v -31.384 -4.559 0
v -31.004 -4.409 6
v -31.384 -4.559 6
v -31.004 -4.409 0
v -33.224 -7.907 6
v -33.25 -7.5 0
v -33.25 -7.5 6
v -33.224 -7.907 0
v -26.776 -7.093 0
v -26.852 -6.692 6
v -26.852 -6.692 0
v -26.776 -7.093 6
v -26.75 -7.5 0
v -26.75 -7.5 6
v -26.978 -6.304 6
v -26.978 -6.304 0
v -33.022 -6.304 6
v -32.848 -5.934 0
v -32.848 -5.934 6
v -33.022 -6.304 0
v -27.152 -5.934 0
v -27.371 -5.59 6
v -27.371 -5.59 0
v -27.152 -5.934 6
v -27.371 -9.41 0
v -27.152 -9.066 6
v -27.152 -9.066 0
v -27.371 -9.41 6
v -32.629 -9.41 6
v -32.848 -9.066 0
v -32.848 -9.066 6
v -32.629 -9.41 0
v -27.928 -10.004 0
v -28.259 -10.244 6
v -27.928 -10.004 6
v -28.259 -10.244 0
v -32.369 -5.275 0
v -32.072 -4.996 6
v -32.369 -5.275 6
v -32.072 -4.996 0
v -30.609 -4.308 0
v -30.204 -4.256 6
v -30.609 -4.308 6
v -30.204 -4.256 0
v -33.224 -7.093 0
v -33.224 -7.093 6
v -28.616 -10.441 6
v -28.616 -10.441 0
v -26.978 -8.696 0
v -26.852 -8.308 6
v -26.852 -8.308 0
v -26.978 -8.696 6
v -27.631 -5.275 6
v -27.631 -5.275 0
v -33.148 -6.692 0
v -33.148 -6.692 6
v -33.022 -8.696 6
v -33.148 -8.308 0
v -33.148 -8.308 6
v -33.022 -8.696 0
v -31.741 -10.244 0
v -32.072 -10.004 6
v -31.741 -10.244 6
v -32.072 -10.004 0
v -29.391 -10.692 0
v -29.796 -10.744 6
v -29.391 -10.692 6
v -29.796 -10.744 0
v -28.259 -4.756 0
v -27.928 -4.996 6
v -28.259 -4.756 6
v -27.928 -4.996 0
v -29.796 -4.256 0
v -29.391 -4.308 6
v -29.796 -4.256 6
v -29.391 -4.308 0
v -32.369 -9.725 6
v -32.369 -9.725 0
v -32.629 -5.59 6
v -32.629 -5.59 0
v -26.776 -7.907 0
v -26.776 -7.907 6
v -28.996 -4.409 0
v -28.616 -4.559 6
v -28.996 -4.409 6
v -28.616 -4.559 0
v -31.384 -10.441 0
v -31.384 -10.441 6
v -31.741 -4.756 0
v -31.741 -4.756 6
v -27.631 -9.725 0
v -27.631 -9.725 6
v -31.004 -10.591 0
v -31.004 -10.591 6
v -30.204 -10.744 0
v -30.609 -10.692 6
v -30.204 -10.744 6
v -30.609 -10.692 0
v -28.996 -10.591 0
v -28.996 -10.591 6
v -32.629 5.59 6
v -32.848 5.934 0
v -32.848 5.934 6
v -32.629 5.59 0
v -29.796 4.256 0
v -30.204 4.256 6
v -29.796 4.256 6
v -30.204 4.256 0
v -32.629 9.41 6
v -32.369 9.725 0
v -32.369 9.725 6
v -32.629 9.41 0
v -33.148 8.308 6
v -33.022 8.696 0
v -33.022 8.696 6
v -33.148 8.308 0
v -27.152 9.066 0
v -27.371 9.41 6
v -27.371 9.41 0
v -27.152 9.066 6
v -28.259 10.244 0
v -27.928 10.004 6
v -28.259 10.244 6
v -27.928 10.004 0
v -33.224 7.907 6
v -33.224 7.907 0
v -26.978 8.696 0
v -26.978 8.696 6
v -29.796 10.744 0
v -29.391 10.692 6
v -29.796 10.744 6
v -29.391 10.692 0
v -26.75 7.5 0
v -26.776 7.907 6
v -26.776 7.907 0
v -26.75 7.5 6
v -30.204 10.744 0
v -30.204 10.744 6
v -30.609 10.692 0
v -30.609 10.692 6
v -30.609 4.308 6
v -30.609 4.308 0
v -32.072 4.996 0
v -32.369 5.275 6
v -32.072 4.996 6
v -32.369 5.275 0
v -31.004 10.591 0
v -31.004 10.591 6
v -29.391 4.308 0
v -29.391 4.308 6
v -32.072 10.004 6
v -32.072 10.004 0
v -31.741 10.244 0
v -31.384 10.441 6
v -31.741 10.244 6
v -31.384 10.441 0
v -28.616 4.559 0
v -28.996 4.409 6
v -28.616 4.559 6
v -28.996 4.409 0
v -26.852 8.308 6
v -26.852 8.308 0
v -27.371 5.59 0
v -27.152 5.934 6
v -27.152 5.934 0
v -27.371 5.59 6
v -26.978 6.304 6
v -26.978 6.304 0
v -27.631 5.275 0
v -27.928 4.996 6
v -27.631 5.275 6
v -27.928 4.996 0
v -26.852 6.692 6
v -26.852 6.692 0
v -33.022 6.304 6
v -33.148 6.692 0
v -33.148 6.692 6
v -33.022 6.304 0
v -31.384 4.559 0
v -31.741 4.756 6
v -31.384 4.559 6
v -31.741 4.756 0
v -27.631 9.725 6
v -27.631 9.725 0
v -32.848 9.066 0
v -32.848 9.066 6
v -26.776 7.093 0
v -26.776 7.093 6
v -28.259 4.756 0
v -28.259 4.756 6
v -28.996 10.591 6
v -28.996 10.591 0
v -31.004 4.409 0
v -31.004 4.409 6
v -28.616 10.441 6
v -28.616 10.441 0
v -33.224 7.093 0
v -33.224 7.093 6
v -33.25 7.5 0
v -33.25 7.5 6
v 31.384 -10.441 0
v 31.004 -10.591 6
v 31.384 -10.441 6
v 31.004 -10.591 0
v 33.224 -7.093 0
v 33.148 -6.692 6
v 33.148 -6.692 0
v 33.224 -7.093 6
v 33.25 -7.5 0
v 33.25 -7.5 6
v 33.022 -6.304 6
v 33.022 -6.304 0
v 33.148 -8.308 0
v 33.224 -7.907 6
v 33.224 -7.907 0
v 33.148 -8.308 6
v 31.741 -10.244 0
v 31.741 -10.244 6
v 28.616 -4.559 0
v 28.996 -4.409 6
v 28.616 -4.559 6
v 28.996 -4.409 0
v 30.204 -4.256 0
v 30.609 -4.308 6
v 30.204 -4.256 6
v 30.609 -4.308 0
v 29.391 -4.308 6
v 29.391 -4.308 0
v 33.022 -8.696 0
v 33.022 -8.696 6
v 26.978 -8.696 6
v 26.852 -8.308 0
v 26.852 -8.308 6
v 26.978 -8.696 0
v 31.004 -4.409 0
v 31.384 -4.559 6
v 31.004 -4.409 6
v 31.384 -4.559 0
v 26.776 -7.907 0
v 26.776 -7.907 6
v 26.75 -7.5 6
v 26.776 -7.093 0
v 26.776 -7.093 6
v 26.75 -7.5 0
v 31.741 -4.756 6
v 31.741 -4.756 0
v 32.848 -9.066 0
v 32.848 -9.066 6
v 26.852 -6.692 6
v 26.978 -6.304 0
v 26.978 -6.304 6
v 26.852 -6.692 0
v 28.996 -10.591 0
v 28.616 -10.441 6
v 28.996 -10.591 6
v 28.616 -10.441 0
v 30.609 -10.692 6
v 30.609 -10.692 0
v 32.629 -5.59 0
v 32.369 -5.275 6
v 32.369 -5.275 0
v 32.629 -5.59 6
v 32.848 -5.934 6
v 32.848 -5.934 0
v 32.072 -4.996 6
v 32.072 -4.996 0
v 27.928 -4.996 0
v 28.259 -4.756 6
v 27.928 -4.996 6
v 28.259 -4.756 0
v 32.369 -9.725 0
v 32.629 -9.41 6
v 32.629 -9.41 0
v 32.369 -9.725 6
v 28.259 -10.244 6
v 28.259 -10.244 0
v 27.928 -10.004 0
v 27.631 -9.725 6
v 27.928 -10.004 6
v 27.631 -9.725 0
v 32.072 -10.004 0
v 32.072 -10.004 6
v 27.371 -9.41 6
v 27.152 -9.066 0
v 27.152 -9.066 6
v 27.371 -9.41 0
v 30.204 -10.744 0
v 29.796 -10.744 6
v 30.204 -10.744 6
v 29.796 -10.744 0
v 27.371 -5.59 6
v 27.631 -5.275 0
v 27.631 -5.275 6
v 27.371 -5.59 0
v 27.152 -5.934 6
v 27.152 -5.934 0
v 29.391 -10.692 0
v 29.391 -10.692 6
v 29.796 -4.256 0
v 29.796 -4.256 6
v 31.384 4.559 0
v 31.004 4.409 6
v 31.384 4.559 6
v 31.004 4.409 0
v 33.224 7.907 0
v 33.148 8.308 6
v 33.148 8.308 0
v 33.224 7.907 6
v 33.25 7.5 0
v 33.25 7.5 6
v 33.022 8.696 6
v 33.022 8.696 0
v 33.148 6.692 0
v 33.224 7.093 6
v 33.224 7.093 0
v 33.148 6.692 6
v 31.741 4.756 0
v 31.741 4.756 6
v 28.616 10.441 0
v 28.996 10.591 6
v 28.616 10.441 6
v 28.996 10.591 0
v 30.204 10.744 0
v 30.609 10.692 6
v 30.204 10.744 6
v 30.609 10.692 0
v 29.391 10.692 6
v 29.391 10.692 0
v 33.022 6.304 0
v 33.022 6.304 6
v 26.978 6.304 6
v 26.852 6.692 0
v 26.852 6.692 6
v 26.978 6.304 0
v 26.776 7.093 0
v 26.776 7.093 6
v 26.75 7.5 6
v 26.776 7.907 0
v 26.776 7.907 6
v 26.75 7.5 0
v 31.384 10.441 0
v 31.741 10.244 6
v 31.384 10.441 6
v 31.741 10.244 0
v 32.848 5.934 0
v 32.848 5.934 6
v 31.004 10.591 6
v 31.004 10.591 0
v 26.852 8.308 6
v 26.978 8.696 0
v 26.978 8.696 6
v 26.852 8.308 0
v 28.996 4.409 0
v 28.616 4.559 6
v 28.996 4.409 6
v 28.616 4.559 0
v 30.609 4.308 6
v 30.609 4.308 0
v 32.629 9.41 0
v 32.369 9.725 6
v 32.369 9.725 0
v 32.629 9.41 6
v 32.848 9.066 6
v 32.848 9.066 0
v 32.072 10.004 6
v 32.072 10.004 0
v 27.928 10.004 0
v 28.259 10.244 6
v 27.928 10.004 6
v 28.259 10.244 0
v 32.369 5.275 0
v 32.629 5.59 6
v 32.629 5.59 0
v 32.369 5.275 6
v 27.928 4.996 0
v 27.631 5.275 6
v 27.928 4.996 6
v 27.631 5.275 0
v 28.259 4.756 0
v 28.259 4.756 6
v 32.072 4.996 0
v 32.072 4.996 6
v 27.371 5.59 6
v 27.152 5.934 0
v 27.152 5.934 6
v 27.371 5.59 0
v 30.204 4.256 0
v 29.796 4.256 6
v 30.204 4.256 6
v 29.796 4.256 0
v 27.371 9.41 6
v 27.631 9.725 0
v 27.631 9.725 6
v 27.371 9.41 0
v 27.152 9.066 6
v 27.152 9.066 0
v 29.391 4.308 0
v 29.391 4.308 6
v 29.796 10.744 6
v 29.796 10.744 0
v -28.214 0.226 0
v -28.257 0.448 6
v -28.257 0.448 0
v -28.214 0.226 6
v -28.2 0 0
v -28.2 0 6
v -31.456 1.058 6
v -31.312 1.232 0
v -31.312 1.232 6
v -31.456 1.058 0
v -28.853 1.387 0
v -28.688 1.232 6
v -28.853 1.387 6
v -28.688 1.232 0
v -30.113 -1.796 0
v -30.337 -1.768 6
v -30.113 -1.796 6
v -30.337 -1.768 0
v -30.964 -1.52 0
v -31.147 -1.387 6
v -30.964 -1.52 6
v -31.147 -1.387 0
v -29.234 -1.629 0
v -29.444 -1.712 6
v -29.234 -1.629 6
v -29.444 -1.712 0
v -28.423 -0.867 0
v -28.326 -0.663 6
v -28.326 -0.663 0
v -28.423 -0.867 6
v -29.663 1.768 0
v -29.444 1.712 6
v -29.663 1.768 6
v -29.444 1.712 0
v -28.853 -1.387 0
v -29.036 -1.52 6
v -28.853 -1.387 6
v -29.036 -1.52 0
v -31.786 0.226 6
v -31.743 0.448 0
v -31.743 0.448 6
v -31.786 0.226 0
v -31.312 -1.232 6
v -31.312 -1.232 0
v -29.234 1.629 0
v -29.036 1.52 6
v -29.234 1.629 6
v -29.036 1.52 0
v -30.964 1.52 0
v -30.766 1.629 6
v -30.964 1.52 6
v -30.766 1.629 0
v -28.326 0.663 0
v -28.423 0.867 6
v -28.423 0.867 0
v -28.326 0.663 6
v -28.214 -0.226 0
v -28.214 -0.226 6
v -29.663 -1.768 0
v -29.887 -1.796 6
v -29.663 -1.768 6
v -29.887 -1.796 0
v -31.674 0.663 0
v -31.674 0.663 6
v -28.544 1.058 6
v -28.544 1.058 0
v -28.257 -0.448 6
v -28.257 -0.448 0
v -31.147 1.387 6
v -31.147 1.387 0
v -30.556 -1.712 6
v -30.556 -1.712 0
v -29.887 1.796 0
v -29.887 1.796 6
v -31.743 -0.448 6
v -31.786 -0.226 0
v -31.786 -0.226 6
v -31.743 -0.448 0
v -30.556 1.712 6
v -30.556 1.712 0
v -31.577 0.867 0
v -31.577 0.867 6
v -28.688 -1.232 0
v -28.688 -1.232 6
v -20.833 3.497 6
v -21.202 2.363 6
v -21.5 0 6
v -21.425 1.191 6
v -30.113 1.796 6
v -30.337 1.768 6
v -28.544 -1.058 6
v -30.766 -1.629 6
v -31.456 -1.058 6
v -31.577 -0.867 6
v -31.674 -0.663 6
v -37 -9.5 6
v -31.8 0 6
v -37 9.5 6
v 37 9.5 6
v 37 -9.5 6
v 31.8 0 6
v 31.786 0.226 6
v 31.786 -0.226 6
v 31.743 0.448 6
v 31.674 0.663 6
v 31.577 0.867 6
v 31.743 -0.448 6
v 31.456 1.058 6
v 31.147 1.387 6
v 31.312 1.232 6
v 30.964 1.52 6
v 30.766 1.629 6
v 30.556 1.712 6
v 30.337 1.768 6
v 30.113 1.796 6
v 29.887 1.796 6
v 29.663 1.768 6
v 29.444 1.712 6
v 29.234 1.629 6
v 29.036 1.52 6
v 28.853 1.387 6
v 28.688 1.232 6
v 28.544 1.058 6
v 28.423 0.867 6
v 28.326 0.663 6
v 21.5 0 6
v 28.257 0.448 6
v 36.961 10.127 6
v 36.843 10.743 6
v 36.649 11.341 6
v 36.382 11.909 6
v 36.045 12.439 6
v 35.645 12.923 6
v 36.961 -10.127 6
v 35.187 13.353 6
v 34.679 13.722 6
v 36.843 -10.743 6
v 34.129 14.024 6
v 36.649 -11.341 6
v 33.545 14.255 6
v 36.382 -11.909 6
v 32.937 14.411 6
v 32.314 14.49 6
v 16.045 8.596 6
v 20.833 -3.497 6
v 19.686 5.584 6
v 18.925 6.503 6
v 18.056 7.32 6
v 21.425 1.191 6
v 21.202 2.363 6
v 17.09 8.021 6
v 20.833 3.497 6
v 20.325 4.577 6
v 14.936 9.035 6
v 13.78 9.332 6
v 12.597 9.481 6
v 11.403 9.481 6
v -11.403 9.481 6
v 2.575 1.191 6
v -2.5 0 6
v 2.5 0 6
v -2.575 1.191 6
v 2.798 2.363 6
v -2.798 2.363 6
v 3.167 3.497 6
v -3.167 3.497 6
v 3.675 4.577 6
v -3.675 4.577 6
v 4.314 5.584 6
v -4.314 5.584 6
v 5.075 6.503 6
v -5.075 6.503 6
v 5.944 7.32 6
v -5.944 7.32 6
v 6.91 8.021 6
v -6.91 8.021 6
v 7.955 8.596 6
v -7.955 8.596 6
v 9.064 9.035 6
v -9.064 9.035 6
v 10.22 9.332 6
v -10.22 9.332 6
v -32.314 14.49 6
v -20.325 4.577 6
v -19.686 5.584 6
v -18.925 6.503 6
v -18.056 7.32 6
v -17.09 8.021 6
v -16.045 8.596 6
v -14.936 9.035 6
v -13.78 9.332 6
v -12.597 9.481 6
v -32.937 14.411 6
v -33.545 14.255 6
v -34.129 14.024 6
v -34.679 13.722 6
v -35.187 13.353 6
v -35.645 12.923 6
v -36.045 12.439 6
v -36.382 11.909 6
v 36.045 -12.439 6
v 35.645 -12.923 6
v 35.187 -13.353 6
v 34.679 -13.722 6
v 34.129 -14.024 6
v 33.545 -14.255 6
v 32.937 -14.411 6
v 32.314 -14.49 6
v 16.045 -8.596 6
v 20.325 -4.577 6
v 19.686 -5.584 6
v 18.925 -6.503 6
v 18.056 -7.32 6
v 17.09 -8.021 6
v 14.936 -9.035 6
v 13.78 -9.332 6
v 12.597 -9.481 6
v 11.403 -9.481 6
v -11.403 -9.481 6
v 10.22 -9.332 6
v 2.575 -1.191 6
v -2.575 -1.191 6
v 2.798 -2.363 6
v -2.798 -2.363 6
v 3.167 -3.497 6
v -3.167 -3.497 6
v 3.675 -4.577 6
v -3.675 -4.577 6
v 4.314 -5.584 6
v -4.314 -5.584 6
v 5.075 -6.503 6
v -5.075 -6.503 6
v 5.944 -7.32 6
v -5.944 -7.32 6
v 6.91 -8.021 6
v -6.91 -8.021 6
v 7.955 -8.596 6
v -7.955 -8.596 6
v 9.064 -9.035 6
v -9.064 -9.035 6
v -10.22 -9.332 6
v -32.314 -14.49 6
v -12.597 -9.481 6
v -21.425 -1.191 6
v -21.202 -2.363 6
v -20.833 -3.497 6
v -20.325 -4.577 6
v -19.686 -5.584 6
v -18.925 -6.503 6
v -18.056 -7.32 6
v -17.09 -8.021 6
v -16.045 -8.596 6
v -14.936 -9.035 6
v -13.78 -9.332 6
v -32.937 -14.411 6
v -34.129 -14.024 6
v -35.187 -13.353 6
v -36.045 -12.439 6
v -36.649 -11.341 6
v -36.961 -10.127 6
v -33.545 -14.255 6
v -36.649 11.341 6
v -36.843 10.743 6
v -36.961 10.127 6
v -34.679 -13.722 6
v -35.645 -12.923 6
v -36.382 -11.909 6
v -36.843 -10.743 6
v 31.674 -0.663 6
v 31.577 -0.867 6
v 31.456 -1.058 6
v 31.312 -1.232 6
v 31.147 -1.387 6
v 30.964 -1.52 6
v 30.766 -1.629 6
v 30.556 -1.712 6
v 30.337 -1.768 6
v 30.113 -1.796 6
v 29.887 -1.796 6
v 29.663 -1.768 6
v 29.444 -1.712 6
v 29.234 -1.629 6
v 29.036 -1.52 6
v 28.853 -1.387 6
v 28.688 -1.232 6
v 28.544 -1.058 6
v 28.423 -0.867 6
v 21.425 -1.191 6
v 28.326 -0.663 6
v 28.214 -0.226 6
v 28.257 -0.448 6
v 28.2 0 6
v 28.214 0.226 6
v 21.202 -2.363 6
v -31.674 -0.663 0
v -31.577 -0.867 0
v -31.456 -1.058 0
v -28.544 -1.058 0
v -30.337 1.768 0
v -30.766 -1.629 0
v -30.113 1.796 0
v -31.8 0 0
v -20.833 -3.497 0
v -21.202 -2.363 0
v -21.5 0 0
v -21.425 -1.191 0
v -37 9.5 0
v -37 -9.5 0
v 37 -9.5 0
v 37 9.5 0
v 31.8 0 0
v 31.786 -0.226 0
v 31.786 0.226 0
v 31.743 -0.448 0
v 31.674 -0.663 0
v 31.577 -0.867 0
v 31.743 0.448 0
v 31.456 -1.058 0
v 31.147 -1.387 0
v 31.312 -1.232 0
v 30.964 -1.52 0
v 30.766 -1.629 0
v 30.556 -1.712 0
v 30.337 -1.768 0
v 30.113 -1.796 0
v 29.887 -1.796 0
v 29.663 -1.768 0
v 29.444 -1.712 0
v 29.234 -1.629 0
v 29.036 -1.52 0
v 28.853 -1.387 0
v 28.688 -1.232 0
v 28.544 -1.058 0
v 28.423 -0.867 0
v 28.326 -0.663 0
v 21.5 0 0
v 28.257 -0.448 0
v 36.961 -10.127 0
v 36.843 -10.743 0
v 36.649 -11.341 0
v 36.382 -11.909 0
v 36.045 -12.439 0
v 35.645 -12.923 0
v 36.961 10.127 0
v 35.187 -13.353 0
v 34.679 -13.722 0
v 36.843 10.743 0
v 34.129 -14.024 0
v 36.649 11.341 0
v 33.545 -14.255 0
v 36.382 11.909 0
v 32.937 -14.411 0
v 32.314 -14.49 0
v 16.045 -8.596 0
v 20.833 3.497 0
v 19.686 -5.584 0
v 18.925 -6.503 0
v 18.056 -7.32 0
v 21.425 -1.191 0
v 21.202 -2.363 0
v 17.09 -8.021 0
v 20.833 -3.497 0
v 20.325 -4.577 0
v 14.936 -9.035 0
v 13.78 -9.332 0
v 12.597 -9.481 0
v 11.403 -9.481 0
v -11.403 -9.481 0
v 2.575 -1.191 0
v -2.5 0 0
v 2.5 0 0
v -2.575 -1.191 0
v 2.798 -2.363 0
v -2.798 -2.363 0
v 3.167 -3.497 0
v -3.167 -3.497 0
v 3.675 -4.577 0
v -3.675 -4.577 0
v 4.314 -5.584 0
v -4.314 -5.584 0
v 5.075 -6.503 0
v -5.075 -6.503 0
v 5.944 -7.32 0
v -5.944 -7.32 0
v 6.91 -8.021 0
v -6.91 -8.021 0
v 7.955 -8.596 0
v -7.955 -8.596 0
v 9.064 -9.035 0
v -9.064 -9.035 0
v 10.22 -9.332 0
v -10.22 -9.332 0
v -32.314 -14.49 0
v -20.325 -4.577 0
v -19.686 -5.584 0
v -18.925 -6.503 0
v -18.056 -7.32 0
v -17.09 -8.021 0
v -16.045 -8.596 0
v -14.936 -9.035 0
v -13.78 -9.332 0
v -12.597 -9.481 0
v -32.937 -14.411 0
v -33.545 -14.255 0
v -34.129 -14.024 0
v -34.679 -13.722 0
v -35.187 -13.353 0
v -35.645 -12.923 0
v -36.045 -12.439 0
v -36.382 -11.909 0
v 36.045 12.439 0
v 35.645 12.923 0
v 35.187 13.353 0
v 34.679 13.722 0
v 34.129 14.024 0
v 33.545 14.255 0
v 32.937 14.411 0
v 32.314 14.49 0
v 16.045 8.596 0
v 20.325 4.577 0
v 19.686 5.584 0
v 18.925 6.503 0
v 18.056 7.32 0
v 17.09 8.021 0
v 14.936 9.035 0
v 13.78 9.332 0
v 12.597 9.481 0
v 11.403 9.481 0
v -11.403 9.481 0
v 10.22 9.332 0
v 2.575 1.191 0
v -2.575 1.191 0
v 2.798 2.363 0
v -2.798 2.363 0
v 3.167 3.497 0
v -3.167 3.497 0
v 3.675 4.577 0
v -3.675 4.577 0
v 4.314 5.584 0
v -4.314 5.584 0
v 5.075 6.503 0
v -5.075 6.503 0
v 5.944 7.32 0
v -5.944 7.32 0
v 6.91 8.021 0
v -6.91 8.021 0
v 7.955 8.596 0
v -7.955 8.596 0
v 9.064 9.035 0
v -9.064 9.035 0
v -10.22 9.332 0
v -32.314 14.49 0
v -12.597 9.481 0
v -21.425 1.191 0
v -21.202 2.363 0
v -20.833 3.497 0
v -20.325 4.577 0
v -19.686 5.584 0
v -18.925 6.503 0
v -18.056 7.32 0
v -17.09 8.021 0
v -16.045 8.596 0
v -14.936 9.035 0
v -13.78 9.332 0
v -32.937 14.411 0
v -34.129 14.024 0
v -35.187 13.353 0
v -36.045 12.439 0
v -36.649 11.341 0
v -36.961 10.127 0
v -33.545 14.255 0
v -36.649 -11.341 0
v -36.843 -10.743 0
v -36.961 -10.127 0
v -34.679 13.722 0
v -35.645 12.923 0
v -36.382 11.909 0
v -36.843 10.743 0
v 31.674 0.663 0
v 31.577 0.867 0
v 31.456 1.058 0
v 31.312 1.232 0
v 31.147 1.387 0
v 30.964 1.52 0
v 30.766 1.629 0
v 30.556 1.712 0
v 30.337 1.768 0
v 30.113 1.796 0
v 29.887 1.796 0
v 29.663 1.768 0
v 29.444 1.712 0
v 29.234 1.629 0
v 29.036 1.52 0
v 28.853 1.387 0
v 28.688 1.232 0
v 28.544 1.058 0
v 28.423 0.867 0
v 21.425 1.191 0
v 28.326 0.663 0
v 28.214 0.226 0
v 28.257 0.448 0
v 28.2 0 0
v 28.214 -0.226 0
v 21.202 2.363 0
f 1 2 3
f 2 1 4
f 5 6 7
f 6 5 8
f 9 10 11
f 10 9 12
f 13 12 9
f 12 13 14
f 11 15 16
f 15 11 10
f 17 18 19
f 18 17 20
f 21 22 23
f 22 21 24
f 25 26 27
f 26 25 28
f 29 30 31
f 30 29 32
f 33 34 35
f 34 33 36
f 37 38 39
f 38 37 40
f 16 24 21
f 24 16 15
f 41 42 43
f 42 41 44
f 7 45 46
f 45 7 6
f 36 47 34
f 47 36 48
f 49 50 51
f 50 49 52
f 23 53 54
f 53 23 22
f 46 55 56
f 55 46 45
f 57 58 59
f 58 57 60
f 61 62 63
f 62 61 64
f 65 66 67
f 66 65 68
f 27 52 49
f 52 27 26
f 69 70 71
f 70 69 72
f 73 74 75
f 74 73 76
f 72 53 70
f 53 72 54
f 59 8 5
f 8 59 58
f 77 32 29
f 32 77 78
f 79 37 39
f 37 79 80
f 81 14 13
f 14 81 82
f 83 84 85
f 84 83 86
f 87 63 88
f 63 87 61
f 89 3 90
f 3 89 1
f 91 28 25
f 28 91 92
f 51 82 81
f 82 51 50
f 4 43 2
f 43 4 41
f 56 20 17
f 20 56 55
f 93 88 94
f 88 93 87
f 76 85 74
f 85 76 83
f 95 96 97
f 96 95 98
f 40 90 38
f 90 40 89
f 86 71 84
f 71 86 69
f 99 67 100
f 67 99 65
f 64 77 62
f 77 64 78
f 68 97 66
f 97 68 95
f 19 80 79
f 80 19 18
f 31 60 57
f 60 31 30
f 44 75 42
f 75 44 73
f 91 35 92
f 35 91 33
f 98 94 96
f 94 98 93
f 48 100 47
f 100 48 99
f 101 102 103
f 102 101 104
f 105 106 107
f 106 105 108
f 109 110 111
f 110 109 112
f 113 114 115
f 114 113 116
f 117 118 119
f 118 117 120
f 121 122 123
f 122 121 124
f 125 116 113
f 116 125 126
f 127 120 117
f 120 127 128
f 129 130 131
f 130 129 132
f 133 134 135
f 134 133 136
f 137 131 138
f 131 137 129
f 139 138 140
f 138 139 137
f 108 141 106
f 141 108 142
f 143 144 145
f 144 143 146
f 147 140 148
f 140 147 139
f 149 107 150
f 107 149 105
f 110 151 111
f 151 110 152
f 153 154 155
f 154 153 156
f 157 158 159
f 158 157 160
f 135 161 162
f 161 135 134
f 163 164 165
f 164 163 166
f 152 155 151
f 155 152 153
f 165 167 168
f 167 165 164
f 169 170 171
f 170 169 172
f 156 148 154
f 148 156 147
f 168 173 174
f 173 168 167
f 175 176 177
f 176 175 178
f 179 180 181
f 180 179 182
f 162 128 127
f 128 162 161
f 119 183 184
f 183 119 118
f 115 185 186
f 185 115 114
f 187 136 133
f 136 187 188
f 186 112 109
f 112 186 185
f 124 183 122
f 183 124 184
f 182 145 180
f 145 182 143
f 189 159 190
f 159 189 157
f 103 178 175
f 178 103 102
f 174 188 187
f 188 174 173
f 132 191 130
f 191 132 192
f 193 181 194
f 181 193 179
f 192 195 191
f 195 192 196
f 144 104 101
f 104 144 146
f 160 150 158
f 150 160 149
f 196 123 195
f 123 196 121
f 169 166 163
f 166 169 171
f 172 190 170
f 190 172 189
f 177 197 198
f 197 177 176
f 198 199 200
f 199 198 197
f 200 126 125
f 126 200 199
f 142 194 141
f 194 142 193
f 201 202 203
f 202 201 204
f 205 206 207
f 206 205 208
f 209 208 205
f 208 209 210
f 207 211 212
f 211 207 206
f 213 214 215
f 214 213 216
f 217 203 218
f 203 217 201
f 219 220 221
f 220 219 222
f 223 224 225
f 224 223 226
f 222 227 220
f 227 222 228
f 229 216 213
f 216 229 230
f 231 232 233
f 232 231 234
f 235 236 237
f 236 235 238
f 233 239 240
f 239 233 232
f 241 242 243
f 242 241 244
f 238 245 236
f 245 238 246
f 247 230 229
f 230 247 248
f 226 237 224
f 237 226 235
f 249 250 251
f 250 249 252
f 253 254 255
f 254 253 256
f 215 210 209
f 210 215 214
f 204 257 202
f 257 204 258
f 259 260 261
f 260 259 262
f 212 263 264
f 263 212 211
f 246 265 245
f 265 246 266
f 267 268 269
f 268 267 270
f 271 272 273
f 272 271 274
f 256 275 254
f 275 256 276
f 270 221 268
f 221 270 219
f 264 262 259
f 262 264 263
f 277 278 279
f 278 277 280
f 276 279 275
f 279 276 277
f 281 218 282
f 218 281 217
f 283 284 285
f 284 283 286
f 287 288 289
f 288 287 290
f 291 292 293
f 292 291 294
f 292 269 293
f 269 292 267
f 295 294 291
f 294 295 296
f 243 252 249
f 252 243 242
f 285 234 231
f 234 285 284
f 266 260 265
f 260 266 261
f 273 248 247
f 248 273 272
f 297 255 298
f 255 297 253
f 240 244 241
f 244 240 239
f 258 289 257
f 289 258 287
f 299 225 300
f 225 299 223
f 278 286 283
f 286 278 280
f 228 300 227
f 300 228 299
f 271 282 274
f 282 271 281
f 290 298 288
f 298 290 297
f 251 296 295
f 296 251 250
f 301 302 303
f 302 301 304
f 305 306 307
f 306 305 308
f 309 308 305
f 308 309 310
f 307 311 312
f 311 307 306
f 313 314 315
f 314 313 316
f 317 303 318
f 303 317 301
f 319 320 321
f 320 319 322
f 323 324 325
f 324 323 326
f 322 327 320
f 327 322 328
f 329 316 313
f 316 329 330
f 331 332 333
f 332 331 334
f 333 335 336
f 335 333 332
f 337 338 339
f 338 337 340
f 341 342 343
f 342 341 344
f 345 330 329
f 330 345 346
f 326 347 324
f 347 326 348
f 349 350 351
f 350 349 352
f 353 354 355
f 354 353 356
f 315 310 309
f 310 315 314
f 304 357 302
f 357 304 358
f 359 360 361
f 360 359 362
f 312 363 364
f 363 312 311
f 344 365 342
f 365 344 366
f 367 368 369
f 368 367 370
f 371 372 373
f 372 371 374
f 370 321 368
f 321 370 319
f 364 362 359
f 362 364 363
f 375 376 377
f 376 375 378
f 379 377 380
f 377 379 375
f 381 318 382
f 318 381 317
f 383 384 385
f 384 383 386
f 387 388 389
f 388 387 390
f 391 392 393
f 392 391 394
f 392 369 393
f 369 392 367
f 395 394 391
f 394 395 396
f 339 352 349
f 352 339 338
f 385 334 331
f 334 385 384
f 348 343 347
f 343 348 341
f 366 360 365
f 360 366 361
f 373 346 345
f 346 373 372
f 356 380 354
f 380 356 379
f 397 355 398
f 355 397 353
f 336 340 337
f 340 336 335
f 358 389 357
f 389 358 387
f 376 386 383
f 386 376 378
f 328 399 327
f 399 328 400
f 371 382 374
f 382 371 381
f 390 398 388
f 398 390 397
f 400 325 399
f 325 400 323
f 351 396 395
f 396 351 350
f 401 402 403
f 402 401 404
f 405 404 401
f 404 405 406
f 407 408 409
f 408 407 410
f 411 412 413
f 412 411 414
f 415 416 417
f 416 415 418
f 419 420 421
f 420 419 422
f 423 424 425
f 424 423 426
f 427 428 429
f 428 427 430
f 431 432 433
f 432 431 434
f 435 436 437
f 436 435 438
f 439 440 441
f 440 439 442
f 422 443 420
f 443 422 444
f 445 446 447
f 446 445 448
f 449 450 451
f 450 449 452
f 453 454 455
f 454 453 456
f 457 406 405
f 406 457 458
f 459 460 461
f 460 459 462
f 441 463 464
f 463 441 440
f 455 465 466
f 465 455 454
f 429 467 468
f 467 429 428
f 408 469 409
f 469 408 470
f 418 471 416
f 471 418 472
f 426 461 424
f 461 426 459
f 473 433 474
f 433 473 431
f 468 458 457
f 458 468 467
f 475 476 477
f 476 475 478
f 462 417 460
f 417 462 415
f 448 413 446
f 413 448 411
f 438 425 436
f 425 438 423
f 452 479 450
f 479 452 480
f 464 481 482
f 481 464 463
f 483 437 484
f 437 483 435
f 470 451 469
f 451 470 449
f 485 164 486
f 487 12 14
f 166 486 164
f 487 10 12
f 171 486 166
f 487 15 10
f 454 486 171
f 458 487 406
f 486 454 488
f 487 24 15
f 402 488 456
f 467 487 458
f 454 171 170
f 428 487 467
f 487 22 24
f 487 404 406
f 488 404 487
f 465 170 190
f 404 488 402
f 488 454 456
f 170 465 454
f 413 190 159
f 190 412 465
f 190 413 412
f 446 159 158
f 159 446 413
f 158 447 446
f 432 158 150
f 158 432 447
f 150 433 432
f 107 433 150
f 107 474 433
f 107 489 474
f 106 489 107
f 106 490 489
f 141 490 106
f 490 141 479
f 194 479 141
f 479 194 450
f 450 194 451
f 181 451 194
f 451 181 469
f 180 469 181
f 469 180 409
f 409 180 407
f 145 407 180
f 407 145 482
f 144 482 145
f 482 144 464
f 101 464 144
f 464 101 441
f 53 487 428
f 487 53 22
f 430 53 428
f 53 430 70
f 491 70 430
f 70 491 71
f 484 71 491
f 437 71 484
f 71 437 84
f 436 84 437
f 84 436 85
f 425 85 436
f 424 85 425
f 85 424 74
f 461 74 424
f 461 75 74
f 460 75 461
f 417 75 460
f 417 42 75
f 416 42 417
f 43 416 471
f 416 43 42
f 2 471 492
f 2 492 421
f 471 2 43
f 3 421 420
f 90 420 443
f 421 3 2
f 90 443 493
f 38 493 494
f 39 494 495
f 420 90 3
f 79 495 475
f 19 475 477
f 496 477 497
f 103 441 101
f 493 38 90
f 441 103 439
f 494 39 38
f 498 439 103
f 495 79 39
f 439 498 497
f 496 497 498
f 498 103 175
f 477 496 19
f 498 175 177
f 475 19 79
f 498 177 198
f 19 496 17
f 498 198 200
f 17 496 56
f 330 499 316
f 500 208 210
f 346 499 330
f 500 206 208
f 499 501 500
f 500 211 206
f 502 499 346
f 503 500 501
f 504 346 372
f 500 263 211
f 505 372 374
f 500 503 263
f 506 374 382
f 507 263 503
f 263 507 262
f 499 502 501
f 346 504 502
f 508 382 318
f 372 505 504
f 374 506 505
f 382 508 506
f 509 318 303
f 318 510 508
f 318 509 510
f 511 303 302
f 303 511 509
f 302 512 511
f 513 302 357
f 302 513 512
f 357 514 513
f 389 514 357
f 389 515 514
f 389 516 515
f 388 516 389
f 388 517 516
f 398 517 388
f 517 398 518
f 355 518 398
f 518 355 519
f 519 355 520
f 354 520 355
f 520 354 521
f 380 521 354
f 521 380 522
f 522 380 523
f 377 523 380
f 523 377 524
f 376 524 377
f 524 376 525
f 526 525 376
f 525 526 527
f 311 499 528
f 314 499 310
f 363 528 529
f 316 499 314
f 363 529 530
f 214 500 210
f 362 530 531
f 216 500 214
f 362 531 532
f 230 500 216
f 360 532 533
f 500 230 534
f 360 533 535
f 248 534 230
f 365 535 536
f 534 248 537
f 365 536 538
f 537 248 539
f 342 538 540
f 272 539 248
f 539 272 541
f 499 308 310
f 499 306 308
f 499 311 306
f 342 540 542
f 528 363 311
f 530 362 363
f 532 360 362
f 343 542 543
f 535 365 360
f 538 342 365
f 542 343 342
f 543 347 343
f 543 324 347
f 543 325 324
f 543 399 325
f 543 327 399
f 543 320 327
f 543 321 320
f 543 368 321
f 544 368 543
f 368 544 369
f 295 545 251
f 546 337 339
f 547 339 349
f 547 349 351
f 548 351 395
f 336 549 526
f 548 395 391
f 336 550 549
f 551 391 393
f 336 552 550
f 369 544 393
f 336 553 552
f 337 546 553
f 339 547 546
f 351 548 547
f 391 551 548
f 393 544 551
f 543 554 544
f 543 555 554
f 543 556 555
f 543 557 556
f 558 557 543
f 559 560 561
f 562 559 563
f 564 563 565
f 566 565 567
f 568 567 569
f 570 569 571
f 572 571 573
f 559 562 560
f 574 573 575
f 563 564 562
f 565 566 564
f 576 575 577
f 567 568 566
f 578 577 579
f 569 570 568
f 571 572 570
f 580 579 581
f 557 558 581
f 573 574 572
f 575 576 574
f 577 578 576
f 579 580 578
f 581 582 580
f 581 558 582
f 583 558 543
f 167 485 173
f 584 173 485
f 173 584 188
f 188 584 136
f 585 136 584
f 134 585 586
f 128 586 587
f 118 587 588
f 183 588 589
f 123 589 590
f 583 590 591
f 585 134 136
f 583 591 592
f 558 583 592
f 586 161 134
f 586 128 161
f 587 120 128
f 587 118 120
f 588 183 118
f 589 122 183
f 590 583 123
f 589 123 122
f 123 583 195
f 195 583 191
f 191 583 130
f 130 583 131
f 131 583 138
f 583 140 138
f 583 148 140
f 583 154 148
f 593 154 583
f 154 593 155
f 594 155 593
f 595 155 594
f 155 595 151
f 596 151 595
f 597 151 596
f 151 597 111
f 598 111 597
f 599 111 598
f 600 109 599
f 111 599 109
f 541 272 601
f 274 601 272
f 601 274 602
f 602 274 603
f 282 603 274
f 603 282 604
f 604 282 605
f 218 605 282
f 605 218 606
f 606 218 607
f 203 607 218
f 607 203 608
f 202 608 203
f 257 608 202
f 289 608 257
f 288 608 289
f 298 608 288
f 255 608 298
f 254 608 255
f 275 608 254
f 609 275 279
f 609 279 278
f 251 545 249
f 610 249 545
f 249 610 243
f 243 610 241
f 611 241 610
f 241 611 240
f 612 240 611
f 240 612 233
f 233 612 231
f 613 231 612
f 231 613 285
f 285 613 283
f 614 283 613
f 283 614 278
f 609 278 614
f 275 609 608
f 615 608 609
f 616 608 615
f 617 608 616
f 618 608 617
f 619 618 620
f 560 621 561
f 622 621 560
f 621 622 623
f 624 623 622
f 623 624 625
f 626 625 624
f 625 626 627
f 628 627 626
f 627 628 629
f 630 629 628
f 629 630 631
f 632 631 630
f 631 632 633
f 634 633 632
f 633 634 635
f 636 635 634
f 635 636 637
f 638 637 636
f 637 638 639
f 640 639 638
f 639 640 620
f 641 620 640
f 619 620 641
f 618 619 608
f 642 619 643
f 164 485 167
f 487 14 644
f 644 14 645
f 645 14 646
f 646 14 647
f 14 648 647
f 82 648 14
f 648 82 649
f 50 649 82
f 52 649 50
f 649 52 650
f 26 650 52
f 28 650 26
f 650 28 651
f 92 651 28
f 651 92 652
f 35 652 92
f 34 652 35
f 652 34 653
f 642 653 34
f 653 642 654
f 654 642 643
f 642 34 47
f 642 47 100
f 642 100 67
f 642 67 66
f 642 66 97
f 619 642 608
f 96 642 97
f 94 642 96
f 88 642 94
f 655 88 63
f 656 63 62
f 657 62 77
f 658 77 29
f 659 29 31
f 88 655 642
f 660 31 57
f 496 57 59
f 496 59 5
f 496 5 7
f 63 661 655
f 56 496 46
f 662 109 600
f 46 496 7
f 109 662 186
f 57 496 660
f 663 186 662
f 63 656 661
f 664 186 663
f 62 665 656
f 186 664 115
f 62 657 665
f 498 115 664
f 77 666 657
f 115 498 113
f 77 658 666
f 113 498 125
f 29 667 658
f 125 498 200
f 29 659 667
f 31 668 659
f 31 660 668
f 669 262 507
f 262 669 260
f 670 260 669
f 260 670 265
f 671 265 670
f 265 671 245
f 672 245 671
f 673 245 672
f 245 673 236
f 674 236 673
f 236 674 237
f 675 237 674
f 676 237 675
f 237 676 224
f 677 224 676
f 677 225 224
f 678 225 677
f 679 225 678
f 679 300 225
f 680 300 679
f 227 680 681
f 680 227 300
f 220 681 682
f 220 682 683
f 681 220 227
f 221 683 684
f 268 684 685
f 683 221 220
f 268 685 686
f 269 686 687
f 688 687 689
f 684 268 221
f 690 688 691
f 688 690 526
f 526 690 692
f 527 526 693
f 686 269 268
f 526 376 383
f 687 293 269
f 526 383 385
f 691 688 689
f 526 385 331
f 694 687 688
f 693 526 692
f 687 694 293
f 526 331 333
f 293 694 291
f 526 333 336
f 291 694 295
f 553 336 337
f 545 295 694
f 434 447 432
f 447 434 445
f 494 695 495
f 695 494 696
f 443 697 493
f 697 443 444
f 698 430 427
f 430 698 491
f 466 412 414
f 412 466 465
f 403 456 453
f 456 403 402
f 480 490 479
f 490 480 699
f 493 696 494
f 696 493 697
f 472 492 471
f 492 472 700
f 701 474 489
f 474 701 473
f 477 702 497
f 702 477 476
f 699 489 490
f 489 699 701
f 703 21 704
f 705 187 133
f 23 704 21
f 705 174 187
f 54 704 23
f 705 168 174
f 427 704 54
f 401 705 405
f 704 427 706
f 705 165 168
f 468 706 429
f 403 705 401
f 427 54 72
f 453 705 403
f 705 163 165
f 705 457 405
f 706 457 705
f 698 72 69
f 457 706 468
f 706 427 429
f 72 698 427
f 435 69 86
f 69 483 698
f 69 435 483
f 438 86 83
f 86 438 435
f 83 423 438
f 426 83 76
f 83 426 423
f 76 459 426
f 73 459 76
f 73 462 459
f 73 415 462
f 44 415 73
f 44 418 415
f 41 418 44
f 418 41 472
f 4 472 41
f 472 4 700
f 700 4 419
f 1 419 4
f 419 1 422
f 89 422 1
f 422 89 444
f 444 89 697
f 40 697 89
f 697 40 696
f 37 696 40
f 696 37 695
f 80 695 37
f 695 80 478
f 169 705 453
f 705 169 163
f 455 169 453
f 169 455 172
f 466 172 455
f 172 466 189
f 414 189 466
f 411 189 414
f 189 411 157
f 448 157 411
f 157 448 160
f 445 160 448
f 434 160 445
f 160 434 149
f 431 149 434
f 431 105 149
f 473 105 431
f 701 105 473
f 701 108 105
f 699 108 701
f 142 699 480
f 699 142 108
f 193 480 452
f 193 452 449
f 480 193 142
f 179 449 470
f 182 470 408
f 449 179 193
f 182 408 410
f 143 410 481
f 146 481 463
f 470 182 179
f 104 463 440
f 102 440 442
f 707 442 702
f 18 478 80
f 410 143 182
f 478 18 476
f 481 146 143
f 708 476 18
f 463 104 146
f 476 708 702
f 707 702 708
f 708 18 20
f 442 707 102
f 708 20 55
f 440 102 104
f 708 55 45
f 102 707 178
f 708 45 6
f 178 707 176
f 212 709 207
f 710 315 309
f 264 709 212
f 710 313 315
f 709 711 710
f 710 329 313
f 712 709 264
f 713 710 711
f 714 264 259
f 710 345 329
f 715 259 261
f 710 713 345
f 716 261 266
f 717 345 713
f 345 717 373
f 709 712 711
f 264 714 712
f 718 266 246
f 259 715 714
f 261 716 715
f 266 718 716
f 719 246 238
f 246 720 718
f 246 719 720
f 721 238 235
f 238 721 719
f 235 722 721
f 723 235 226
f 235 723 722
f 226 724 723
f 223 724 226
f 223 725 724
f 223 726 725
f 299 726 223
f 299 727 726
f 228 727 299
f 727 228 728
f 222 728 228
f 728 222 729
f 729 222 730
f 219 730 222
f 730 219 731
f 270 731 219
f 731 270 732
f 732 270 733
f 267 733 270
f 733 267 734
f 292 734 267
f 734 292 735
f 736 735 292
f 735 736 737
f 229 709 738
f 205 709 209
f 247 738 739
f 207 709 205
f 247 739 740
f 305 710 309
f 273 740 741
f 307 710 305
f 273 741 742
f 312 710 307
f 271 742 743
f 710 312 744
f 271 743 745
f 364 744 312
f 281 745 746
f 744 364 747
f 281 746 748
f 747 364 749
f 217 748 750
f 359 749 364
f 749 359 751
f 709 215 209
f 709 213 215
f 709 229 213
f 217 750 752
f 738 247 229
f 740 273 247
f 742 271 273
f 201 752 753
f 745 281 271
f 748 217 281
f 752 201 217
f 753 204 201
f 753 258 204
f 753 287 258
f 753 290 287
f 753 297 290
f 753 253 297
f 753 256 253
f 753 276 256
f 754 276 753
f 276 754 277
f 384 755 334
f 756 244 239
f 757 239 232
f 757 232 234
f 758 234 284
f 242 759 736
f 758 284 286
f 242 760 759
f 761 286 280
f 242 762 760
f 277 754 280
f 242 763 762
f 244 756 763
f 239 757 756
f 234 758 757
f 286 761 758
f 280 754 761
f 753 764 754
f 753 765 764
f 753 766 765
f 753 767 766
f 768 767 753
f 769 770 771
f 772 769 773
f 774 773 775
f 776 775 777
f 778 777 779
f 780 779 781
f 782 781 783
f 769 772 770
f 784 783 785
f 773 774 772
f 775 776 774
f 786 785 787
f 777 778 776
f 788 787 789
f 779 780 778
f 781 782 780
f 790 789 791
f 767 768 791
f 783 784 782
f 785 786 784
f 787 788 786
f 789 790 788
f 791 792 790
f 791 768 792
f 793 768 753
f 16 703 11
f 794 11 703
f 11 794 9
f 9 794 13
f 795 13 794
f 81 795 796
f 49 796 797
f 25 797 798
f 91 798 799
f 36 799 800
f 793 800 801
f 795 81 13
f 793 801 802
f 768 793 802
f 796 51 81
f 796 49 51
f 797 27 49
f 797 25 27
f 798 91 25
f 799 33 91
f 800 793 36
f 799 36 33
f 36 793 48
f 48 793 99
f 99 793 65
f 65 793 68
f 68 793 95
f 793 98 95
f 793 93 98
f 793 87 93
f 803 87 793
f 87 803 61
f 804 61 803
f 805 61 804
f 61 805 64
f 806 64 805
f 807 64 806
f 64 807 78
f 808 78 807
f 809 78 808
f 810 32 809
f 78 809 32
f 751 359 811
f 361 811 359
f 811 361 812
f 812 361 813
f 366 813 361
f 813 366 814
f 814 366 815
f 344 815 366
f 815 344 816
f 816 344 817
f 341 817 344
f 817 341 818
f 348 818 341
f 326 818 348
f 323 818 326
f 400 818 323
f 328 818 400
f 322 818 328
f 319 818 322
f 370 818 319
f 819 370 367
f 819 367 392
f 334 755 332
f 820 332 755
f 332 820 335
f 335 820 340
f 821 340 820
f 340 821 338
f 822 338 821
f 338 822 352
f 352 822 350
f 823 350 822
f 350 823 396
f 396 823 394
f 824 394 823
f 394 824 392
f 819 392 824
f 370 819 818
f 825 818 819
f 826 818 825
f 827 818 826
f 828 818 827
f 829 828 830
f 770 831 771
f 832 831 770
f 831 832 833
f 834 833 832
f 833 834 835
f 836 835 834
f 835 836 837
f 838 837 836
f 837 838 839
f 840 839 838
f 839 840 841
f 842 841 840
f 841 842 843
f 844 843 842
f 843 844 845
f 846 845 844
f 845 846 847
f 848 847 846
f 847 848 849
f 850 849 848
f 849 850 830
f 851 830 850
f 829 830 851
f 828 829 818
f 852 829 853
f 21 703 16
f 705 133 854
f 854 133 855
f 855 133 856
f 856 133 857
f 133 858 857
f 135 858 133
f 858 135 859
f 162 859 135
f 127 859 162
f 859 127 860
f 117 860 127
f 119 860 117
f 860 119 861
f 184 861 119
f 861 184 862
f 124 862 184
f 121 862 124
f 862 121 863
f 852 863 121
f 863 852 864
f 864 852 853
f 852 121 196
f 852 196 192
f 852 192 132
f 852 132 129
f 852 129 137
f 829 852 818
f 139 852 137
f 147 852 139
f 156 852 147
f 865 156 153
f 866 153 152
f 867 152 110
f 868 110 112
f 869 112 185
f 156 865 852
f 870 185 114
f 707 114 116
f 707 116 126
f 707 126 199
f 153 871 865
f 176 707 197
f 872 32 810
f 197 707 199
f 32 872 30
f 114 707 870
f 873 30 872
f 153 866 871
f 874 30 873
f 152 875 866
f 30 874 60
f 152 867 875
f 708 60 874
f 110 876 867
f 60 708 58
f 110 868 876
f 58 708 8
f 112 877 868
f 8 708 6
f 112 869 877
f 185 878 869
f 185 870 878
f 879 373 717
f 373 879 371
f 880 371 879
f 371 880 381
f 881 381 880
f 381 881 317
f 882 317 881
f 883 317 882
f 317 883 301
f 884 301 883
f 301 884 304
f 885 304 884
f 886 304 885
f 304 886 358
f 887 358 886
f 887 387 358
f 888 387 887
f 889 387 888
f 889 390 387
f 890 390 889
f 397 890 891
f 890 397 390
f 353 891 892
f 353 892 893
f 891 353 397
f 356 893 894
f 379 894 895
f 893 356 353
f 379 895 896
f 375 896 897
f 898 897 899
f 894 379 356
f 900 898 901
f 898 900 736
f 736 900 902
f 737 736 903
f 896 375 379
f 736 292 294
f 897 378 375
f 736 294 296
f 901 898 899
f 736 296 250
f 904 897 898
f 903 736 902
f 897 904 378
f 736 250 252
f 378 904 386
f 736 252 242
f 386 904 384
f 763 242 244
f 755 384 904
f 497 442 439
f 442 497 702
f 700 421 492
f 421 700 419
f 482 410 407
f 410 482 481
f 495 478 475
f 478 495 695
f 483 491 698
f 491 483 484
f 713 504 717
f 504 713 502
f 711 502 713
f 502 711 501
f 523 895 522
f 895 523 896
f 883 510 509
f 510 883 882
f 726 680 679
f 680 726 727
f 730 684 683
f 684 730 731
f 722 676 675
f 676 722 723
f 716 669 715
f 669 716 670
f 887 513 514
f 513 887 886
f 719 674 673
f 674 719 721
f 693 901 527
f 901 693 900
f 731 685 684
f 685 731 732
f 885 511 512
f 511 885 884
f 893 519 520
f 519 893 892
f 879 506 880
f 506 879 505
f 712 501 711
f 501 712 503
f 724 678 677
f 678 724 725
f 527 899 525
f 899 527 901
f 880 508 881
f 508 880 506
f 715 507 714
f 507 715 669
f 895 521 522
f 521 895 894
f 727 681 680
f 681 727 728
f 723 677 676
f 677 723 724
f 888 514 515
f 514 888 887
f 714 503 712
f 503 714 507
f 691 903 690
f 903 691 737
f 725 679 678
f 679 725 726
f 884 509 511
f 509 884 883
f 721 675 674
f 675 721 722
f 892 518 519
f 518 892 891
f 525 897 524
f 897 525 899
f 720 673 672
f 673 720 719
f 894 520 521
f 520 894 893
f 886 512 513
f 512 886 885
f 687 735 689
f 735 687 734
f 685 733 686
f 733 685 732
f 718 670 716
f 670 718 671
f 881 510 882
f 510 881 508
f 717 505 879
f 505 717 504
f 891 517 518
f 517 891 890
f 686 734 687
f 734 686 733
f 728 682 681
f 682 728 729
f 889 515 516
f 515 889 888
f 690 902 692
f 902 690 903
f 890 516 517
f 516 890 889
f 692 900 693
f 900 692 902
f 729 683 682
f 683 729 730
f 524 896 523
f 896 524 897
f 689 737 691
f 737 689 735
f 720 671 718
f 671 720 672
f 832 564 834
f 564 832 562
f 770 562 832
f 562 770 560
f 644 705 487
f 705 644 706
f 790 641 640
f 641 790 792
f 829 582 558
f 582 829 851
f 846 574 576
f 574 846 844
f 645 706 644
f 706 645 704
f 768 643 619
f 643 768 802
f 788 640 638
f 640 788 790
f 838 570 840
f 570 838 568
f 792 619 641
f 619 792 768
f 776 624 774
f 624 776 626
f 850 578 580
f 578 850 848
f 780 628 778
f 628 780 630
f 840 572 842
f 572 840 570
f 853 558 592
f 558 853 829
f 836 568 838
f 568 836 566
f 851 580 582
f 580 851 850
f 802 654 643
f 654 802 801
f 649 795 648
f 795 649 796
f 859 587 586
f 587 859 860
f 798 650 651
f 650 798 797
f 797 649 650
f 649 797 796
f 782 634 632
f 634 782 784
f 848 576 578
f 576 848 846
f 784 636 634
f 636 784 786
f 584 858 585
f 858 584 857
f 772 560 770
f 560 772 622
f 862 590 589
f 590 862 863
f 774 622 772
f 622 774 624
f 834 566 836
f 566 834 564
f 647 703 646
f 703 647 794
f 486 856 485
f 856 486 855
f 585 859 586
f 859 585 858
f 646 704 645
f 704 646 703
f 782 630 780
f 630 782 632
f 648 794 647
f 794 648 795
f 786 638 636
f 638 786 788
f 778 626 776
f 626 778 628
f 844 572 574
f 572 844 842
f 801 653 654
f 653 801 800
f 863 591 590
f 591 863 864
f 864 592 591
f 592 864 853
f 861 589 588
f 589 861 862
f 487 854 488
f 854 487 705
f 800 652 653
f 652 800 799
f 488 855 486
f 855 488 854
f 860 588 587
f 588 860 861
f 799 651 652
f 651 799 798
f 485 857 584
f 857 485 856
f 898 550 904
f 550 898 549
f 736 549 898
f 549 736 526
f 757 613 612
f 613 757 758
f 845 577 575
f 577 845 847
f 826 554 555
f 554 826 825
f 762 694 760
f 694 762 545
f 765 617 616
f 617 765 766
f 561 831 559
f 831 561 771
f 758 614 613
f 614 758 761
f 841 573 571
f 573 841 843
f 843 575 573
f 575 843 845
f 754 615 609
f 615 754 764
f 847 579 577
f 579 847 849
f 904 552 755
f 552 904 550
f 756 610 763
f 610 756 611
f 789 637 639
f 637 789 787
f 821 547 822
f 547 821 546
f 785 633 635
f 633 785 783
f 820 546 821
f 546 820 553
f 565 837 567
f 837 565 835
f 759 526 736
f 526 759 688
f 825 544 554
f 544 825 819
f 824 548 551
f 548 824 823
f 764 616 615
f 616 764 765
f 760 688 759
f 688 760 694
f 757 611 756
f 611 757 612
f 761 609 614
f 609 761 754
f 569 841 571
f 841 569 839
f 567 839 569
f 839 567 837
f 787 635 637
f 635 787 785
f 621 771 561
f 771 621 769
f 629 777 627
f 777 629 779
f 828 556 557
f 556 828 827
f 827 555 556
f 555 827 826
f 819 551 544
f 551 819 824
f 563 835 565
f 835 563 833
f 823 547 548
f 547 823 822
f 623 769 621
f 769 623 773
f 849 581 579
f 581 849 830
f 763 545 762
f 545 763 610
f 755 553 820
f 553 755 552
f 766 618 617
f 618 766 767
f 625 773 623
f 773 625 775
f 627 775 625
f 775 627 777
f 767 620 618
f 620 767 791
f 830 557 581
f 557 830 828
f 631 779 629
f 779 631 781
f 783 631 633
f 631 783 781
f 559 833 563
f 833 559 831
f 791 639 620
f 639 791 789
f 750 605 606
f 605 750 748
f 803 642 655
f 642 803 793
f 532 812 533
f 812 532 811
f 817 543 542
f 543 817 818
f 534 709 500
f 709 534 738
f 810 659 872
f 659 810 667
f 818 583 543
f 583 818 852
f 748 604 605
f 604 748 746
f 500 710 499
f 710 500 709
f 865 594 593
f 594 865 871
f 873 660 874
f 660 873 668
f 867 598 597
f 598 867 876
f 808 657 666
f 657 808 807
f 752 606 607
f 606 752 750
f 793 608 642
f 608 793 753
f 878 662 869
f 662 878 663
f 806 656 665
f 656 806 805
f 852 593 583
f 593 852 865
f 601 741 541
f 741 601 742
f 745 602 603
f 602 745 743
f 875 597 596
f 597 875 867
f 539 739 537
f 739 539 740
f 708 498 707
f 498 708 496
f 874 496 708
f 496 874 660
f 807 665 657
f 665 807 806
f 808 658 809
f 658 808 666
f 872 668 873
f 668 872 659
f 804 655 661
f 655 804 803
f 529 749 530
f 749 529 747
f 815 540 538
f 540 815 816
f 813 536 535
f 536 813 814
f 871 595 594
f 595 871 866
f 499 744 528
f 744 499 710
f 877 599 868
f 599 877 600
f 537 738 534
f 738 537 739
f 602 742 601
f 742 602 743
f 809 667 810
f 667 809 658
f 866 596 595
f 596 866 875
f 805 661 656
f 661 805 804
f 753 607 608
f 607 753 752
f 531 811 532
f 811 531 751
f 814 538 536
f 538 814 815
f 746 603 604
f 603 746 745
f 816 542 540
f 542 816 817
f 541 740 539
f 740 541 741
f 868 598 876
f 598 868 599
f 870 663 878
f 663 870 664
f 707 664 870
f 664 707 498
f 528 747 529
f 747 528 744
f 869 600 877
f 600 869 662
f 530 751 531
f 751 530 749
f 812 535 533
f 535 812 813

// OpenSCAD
$fn = 50;


difference() {
	union() {
		hull() {
			translate(v = [-32.0000000000, 9.5000000000, 0]) {
				cylinder(h = 6, r = 5);
			}
			translate(v = [32.0000000000, 9.5000000000, 0]) {
				cylinder(h = 6, r = 5);
			}
			translate(v = [-32.0000000000, -9.5000000000, 0]) {
				cylinder(h = 6, r = 5);
			}
			translate(v = [32.0000000000, -9.5000000000, 0]) {
				cylinder(h = 6, r = 5);
			}
		}
	}
	union() {
		#translate(v = [-30.0000000000, -7.5000000000, 0]) {
			cylinder(h = 6, r = 3.2500000000);
		}
		#translate(v = [-30.0000000000, 7.5000000000, 0]) {
			cylinder(h = 6, r = 3.2500000000);
		}
		#translate(v = [30.0000000000, -7.5000000000, 0]) {
			cylinder(h = 6, r = 3.2500000000);
		}
		#translate(v = [30.0000000000, 7.5000000000, 0]) {
			cylinder(h = 6, r = 3.2500000000);
		}
		#translate(v = [-30.0000000000, -7.5000000000, -100.0000000000]) {
			cylinder(h = 200, r = 3.2500000000);
		}
		#translate(v = [-30.0000000000, 7.5000000000, -100.0000000000]) {
			cylinder(h = 200, r = 3.2500000000);
		}
		#translate(v = [30.0000000000, -7.5000000000, -100.0000000000]) {
			cylinder(h = 200, r = 3.2500000000);
		}
		#translate(v = [30.0000000000, 7.5000000000, -100.0000000000]) {
			cylinder(h = 200, r = 3.2500000000);
		}
		#translate(v = [-30.0000000000, -7.5000000000, 0]) {
			cylinder(h = 6, r = 1.8000000000);
		}
		#translate(v = [-30.0000000000, 0.0000000000, 0]) {
			cylinder(h = 6, r = 1.8000000000);
		}
		#translate(v = [-30.0000000000, 7.5000000000, 0]) {
			cylinder(h = 6, r = 1.8000000000);
		}
		#translate(v = [30.0000000000, -7.5000000000, 0]) {
			cylinder(h = 6, r = 1.8000000000);
		}
		#translate(v = [30.0000000000, 0.0000000000, 0]) {
			cylinder(h = 6, r = 1.8000000000);
		}
		#translate(v = [30.0000000000, 7.5000000000, 0]) {
			cylinder(h = 6, r = 1.8000000000);
		}
		#translate(v = [-30.0000000000, -7.5000000000, 0]) {
			cylinder(h = 6, r = 1.8000000000);
		}
		#translate(v = [-30.0000000000, 0.0000000000, 0]) {
			cylinder(h = 6, r = 1.8000000000);
		}
		#translate(v = [-30.0000000000, 7.5000000000, 0]) {
			cylinder(h = 6, r = 1.8000000000);
		}
		#translate(v = [30.0000000000, -7.5000000000, 0]) {
			cylinder(h = 6, r = 1.8000000000);
		}
		#translate(v = [30.0000000000, 0.0000000000, 0]) {
			cylinder(h = 6, r = 1.8000000000);
		}
		#translate(v = [30.0000000000, 7.5000000000, 0]) {
			cylinder(h = 6, r = 1.8000000000);
		}
		#translate(v = [-30.0000000000, -7.5000000000, 0]) {
			cylinder(h = 6, r = 1.8000000000);
		}
		#translate(v = [-30.0000000000, 0.0000000000, 0]) {
			cylinder(h = 6, r = 1.8000000000);
		}
		#translate(v = [-30.0000000000, 7.5000000000, 0]) {
			cylinder(h = 6, r = 1.8000000000);
		}
		#translate(v = [30.0000000000, -7.5000000000, 0]) {
			cylinder(h = 6, r = 1.8000000000);
		}
		#translate(v = [30.0000000000, 0.0000000000, 0]) {
			cylinder(h = 6, r = 1.8000000000);
		}
		#translate(v = [30.0000000000, 7.5000000000, 0]) {
			cylinder(h = 6, r = 1.8000000000);
		}
		#translate(v = [-12.0000000000, 0, 0]) {
			cylinder(h = 6, r = 9.5000000000);
		}
		#translate(v = [12.0000000000, 0, 0]) {
			cylinder(h = 6, r = 9.5000000000);
		}
	}
}
